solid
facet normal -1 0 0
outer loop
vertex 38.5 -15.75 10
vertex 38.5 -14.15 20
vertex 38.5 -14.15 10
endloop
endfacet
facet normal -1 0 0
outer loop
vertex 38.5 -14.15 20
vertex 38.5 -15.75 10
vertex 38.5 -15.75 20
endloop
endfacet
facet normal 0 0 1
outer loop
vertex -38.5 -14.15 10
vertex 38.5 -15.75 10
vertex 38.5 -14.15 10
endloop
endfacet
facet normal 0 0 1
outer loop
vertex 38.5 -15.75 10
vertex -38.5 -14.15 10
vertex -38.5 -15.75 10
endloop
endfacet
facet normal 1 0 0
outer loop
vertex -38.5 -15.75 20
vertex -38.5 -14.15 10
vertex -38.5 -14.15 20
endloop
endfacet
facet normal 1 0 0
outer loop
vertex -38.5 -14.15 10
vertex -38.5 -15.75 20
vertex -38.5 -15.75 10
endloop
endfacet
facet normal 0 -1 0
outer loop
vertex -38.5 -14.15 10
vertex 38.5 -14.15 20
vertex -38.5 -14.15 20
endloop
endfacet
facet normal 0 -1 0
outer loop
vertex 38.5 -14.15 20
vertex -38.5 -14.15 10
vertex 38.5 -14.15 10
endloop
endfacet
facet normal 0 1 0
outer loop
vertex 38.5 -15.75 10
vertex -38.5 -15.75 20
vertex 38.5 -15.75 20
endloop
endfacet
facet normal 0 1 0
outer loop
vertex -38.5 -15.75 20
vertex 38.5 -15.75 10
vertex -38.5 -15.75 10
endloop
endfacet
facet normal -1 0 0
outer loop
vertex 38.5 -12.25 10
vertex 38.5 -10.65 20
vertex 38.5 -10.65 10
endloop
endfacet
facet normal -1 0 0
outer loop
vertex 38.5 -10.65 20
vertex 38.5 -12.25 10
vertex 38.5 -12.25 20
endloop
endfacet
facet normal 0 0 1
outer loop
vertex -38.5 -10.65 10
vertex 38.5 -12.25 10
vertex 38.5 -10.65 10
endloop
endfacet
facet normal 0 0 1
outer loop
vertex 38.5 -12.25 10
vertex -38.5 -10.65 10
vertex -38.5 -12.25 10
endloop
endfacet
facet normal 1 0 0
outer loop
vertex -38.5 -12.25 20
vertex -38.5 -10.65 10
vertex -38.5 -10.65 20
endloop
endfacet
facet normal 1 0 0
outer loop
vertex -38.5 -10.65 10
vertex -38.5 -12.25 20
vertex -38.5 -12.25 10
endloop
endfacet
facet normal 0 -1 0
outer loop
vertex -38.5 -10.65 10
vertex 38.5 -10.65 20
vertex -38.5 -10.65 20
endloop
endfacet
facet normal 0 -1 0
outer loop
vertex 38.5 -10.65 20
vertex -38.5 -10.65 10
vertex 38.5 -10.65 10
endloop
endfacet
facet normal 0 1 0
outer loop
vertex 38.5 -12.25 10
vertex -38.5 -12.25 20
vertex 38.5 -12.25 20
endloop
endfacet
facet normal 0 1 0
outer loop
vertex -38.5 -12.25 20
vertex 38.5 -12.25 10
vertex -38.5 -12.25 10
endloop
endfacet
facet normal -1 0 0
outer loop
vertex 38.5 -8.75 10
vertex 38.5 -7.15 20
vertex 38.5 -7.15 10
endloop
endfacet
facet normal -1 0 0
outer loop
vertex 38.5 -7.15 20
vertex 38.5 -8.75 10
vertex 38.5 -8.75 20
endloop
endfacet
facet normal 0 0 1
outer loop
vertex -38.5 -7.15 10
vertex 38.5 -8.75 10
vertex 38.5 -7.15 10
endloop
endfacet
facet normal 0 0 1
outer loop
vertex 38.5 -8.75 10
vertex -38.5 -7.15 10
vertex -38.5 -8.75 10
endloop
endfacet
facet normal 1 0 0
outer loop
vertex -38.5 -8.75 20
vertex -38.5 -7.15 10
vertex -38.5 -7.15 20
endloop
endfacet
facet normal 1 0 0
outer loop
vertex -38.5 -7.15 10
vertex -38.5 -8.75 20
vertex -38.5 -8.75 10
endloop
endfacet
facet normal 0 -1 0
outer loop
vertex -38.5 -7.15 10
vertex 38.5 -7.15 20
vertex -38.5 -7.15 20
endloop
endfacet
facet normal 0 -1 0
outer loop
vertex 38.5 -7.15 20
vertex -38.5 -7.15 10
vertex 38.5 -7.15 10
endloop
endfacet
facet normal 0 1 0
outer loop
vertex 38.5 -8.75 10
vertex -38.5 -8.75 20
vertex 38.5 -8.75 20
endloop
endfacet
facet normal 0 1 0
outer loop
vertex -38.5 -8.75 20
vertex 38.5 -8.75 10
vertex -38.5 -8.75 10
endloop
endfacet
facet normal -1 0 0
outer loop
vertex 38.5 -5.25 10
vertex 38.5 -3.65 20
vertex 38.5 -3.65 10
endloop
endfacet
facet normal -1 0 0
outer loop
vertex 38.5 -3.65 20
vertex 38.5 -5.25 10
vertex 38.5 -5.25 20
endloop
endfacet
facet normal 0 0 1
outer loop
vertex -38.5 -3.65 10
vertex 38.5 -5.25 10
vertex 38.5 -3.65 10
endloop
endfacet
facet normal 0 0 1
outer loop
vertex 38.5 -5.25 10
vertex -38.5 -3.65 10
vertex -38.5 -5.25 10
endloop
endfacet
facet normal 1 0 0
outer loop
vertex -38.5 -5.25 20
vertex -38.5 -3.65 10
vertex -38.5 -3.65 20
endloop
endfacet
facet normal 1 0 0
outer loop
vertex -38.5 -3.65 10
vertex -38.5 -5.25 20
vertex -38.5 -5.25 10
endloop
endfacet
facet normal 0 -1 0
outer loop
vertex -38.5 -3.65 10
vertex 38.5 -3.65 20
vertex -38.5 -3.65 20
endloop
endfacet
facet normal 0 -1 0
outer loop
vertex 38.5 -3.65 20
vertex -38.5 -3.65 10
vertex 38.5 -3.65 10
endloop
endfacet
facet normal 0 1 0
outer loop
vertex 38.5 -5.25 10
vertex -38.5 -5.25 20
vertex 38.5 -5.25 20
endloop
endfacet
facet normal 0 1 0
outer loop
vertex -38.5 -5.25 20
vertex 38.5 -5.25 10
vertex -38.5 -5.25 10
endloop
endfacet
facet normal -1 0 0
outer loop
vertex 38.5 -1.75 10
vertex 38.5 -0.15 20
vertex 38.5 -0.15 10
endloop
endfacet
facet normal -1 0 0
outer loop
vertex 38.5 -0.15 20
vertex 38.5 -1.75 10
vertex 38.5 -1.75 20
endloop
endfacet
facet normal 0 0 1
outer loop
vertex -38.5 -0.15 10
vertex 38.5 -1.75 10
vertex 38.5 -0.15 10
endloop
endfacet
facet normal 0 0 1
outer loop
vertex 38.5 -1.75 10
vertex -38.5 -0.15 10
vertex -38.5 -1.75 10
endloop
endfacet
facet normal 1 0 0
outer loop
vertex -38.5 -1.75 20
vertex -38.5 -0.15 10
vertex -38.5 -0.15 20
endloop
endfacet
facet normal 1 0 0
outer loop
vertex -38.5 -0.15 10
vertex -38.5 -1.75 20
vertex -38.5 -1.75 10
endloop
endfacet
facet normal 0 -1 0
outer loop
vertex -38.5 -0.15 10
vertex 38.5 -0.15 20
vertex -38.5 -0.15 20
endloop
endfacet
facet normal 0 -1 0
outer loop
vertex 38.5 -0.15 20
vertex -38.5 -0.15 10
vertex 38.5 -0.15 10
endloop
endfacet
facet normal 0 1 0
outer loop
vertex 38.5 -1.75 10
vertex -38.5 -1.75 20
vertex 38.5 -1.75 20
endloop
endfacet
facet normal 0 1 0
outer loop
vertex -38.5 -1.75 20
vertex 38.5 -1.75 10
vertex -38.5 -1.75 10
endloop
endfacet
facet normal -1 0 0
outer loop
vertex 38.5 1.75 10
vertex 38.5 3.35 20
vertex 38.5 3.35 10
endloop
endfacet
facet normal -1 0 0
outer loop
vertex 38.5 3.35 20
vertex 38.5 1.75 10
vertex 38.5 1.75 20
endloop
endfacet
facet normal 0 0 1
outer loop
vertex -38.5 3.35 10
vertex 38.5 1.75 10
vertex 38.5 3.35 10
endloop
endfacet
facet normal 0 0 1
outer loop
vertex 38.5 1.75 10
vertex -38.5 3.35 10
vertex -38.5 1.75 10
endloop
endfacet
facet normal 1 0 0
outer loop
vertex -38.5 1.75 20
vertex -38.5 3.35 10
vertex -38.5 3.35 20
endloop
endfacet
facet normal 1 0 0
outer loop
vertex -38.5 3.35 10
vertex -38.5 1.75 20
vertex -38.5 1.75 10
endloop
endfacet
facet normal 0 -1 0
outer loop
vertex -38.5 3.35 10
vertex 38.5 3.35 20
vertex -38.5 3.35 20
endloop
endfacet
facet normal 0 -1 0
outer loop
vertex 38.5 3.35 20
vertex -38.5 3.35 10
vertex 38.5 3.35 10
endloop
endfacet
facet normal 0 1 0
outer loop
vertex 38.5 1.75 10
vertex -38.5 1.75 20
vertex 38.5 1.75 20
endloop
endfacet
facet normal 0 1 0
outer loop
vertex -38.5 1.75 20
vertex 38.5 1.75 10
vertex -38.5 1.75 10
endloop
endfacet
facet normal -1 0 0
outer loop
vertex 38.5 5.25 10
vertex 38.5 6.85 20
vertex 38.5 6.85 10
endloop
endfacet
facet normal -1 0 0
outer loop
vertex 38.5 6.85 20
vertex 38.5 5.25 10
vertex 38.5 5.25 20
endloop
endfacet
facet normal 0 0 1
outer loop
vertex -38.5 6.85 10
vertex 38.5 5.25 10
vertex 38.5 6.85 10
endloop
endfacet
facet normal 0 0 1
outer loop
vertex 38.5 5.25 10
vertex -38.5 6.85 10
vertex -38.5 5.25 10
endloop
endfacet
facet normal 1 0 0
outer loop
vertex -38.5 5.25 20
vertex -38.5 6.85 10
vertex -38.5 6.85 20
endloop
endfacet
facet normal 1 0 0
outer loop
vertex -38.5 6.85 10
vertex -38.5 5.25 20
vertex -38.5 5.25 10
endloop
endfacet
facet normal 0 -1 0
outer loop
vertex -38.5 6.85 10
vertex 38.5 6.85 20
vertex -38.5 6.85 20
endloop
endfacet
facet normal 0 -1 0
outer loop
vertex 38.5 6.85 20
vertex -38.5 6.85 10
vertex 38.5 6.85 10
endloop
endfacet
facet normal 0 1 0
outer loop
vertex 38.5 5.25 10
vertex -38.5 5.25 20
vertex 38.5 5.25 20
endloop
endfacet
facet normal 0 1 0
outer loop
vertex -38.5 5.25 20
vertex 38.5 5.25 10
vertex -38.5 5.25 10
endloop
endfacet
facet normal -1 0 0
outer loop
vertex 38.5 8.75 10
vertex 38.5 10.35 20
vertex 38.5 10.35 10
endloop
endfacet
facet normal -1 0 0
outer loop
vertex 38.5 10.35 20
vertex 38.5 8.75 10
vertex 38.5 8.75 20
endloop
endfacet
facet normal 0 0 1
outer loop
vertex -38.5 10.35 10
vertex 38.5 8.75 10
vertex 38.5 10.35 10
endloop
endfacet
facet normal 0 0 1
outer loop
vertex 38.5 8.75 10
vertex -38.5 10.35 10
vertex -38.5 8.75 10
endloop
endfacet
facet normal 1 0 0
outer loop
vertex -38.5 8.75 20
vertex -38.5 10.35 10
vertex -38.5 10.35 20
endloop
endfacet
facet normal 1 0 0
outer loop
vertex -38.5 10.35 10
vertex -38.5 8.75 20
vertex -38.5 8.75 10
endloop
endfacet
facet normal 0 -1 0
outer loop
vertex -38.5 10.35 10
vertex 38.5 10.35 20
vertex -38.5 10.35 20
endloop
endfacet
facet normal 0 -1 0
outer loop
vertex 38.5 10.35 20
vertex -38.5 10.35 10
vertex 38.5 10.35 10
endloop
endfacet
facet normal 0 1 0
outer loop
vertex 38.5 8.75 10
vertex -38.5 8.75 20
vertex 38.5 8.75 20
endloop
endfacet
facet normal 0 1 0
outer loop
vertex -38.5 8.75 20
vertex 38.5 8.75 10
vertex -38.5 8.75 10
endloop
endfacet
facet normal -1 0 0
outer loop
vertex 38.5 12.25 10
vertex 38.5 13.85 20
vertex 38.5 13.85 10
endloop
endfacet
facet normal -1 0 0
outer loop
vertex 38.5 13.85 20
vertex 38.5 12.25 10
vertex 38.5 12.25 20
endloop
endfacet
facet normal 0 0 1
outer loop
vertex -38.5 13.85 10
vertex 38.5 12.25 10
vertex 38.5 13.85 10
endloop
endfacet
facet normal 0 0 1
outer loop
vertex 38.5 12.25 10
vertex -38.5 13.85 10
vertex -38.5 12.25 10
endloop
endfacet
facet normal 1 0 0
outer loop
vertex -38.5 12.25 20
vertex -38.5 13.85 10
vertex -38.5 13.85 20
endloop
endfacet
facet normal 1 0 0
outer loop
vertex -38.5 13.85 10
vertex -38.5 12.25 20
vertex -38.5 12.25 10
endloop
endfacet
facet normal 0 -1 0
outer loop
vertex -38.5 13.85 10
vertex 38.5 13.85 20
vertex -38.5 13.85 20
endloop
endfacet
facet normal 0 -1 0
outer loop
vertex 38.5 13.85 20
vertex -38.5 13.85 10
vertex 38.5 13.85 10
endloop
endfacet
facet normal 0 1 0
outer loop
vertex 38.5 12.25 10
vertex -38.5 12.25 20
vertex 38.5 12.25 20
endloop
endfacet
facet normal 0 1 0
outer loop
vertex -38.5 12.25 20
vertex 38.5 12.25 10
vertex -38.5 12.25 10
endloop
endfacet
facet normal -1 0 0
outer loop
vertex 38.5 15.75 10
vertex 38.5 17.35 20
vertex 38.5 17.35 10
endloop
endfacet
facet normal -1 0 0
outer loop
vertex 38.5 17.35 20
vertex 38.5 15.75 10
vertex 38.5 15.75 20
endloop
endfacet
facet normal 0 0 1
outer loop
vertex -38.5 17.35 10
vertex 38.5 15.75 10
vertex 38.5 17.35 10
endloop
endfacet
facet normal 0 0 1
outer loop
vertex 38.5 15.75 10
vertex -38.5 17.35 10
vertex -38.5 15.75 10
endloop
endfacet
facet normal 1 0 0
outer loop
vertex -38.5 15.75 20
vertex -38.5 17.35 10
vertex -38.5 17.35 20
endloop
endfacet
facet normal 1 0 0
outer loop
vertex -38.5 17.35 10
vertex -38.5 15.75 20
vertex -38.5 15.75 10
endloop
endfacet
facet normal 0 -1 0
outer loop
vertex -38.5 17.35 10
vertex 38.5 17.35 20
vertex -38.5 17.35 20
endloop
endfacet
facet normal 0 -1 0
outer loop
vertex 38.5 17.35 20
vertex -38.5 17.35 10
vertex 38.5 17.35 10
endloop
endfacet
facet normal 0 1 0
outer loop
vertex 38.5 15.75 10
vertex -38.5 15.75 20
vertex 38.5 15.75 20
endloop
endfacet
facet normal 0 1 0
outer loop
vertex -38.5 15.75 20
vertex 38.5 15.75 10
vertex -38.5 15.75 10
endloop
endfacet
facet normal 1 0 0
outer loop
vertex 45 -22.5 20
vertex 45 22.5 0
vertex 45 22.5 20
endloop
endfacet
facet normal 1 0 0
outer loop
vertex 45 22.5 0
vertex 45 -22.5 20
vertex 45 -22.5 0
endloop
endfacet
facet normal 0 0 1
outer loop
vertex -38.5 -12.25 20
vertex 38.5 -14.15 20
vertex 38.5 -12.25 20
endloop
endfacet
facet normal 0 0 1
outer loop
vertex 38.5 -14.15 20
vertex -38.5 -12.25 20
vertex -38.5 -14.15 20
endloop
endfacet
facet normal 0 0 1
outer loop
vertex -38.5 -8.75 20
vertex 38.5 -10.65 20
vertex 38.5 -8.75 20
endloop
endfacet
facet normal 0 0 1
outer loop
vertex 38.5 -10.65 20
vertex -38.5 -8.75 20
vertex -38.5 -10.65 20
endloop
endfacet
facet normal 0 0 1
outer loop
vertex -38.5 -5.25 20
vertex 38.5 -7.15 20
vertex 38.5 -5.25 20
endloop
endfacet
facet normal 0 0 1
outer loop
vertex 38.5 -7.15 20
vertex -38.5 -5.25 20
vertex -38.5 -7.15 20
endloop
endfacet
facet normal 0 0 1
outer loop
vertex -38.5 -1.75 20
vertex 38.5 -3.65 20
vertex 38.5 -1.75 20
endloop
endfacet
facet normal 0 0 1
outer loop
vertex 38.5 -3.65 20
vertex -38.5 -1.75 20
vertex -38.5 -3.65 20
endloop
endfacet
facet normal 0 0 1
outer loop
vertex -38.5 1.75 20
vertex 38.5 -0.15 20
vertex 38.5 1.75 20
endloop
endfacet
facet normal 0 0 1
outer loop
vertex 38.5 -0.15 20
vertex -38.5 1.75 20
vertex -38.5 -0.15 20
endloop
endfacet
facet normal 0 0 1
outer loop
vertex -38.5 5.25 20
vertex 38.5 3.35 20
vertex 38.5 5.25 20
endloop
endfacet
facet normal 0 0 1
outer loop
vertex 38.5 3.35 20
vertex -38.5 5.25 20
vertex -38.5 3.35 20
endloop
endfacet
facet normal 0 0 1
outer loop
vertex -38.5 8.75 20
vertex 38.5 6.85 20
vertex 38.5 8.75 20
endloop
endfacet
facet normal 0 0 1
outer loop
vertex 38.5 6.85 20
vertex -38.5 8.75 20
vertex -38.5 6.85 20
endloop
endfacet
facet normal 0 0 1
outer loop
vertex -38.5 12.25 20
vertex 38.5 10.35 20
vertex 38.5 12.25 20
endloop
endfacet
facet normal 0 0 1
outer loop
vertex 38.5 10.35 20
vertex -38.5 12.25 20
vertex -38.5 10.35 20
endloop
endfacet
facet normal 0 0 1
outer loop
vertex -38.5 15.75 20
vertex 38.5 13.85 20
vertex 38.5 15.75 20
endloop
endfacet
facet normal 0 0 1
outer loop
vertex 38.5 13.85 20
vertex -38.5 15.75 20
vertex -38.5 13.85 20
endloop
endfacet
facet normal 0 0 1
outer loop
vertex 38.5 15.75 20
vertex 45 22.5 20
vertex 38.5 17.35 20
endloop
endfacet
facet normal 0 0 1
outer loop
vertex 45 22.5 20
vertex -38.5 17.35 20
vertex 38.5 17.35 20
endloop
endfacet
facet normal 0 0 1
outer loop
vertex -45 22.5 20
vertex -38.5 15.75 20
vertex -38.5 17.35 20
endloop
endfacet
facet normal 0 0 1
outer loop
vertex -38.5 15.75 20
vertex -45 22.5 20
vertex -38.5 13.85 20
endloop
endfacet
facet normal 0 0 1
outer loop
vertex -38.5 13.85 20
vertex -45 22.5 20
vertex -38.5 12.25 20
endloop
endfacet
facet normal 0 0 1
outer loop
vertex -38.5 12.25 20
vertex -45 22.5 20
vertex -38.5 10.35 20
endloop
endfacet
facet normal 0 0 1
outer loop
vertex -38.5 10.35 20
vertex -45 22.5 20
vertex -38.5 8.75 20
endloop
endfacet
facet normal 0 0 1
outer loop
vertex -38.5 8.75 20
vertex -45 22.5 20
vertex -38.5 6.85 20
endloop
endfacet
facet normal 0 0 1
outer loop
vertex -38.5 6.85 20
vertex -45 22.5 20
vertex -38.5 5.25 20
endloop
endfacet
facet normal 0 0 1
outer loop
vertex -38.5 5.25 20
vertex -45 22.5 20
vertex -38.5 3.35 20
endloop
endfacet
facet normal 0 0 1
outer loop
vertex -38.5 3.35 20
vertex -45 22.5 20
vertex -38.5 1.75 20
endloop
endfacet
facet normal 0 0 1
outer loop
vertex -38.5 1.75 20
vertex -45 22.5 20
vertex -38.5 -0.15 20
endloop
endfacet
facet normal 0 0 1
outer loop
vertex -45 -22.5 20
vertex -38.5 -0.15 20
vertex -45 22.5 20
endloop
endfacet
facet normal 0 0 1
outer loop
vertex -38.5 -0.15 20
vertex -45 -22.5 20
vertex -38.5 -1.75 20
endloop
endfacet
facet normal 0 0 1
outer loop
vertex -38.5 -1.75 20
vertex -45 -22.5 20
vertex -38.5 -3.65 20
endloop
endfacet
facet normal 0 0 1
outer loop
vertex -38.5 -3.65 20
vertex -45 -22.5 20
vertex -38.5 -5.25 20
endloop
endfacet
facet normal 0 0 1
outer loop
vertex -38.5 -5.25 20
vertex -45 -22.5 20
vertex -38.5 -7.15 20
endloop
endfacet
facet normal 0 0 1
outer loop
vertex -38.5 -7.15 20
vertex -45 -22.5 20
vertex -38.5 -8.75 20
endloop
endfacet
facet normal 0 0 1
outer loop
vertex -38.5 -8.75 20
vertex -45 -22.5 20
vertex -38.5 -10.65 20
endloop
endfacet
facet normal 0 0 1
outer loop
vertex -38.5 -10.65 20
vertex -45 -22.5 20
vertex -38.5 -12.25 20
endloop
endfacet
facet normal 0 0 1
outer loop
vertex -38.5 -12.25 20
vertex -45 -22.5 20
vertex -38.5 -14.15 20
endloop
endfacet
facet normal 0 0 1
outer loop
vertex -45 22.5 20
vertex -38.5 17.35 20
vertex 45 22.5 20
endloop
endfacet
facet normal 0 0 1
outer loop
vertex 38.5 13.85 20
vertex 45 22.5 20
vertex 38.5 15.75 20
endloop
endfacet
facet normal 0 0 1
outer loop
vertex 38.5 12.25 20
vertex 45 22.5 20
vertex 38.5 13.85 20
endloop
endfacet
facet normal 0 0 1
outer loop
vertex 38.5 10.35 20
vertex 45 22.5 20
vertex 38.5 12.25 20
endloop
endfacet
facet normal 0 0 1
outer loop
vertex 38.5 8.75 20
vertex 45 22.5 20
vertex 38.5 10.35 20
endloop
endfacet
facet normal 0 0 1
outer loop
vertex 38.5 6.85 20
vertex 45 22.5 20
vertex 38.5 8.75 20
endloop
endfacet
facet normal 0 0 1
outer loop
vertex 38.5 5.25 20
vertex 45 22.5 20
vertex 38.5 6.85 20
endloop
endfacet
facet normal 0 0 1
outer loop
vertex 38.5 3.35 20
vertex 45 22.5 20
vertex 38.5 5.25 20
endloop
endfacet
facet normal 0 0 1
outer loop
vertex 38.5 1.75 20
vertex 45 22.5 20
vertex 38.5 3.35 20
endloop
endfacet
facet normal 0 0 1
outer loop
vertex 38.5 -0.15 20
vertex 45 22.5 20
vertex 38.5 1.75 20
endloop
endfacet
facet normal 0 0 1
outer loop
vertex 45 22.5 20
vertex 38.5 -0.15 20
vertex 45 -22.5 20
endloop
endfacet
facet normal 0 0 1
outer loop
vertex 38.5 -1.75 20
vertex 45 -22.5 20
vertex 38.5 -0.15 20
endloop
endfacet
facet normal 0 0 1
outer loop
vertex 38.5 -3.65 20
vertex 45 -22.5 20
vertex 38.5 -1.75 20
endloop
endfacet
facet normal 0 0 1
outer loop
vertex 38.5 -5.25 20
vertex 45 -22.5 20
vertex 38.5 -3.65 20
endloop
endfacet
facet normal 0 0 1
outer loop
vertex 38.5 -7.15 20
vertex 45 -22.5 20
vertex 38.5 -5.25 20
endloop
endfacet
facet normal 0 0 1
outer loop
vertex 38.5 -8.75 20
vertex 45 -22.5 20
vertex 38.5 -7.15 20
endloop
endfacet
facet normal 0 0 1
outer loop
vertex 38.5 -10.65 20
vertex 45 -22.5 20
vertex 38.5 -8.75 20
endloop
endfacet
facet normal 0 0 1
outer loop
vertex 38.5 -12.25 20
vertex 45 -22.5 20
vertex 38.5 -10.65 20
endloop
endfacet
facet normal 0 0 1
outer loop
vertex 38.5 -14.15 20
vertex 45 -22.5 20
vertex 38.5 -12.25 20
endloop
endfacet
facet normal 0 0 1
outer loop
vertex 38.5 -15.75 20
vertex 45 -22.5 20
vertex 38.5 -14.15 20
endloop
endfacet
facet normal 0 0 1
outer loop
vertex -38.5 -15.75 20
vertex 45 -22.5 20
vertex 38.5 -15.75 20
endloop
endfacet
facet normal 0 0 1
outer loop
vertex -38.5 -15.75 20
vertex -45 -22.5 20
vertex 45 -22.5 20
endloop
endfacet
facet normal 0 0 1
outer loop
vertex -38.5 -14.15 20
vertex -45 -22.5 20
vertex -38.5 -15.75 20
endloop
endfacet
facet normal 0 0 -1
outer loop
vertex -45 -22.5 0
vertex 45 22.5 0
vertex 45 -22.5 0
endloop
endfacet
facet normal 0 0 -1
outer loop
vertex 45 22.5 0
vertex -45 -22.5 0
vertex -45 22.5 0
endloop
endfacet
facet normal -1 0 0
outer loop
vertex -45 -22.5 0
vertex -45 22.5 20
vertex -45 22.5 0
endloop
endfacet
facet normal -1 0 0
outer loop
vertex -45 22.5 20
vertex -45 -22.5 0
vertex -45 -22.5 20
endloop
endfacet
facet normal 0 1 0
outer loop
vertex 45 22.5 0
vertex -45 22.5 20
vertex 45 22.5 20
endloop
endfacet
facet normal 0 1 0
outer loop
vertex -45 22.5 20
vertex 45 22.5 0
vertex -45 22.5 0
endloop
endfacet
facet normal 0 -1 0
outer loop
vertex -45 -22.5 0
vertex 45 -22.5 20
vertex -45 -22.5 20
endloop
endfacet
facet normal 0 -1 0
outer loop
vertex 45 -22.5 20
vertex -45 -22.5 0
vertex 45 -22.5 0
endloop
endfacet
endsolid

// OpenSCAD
// Microscope slide drying rack
// Print orientation: base block on XY plane, slots open upward (+Z)

// ---------------- Parameters ----------------
block_len    = 90;    // base block length (X)
block_wid    = 45;    // base block width (Y)
block_h      = 20;    // base block height (Z)

slot_count   = 10;    // number of slide slots
slot_len     = 77;    // slot length along X
slot_w       = 1.6;   // slot width along Y
slot_depth   = 10;    // slot depth from top face
slot_pitch   = 3.5;   // centre-to-centre spacing in Y

eps          = 0.5;   // overshoot for clean boolean cuts
$fn          = 64;    // curve resolution (no curved features, set per rules)

// ---------------- Derived ----------------
slot_x0 = -slot_len / 2;          // slot start X
slot_y0 = -(slot_count - 1) * slot_pitch / 2;  // first slot Y (group centred)

// ---------------- Model ----------------
difference() {
    // Base block
    translate([-block_len / 2, -block_wid / 2, 0])
        cube([block_len, block_wid, block_h]);

    // Parallel slots, open at top
    for (i = [0 : slot_count - 1])
        translate([slot_x0, slot_y0 + i * slot_pitch, block_h - slot_depth])
            cube([slot_len, slot_w, slot_depth + eps]);
}
